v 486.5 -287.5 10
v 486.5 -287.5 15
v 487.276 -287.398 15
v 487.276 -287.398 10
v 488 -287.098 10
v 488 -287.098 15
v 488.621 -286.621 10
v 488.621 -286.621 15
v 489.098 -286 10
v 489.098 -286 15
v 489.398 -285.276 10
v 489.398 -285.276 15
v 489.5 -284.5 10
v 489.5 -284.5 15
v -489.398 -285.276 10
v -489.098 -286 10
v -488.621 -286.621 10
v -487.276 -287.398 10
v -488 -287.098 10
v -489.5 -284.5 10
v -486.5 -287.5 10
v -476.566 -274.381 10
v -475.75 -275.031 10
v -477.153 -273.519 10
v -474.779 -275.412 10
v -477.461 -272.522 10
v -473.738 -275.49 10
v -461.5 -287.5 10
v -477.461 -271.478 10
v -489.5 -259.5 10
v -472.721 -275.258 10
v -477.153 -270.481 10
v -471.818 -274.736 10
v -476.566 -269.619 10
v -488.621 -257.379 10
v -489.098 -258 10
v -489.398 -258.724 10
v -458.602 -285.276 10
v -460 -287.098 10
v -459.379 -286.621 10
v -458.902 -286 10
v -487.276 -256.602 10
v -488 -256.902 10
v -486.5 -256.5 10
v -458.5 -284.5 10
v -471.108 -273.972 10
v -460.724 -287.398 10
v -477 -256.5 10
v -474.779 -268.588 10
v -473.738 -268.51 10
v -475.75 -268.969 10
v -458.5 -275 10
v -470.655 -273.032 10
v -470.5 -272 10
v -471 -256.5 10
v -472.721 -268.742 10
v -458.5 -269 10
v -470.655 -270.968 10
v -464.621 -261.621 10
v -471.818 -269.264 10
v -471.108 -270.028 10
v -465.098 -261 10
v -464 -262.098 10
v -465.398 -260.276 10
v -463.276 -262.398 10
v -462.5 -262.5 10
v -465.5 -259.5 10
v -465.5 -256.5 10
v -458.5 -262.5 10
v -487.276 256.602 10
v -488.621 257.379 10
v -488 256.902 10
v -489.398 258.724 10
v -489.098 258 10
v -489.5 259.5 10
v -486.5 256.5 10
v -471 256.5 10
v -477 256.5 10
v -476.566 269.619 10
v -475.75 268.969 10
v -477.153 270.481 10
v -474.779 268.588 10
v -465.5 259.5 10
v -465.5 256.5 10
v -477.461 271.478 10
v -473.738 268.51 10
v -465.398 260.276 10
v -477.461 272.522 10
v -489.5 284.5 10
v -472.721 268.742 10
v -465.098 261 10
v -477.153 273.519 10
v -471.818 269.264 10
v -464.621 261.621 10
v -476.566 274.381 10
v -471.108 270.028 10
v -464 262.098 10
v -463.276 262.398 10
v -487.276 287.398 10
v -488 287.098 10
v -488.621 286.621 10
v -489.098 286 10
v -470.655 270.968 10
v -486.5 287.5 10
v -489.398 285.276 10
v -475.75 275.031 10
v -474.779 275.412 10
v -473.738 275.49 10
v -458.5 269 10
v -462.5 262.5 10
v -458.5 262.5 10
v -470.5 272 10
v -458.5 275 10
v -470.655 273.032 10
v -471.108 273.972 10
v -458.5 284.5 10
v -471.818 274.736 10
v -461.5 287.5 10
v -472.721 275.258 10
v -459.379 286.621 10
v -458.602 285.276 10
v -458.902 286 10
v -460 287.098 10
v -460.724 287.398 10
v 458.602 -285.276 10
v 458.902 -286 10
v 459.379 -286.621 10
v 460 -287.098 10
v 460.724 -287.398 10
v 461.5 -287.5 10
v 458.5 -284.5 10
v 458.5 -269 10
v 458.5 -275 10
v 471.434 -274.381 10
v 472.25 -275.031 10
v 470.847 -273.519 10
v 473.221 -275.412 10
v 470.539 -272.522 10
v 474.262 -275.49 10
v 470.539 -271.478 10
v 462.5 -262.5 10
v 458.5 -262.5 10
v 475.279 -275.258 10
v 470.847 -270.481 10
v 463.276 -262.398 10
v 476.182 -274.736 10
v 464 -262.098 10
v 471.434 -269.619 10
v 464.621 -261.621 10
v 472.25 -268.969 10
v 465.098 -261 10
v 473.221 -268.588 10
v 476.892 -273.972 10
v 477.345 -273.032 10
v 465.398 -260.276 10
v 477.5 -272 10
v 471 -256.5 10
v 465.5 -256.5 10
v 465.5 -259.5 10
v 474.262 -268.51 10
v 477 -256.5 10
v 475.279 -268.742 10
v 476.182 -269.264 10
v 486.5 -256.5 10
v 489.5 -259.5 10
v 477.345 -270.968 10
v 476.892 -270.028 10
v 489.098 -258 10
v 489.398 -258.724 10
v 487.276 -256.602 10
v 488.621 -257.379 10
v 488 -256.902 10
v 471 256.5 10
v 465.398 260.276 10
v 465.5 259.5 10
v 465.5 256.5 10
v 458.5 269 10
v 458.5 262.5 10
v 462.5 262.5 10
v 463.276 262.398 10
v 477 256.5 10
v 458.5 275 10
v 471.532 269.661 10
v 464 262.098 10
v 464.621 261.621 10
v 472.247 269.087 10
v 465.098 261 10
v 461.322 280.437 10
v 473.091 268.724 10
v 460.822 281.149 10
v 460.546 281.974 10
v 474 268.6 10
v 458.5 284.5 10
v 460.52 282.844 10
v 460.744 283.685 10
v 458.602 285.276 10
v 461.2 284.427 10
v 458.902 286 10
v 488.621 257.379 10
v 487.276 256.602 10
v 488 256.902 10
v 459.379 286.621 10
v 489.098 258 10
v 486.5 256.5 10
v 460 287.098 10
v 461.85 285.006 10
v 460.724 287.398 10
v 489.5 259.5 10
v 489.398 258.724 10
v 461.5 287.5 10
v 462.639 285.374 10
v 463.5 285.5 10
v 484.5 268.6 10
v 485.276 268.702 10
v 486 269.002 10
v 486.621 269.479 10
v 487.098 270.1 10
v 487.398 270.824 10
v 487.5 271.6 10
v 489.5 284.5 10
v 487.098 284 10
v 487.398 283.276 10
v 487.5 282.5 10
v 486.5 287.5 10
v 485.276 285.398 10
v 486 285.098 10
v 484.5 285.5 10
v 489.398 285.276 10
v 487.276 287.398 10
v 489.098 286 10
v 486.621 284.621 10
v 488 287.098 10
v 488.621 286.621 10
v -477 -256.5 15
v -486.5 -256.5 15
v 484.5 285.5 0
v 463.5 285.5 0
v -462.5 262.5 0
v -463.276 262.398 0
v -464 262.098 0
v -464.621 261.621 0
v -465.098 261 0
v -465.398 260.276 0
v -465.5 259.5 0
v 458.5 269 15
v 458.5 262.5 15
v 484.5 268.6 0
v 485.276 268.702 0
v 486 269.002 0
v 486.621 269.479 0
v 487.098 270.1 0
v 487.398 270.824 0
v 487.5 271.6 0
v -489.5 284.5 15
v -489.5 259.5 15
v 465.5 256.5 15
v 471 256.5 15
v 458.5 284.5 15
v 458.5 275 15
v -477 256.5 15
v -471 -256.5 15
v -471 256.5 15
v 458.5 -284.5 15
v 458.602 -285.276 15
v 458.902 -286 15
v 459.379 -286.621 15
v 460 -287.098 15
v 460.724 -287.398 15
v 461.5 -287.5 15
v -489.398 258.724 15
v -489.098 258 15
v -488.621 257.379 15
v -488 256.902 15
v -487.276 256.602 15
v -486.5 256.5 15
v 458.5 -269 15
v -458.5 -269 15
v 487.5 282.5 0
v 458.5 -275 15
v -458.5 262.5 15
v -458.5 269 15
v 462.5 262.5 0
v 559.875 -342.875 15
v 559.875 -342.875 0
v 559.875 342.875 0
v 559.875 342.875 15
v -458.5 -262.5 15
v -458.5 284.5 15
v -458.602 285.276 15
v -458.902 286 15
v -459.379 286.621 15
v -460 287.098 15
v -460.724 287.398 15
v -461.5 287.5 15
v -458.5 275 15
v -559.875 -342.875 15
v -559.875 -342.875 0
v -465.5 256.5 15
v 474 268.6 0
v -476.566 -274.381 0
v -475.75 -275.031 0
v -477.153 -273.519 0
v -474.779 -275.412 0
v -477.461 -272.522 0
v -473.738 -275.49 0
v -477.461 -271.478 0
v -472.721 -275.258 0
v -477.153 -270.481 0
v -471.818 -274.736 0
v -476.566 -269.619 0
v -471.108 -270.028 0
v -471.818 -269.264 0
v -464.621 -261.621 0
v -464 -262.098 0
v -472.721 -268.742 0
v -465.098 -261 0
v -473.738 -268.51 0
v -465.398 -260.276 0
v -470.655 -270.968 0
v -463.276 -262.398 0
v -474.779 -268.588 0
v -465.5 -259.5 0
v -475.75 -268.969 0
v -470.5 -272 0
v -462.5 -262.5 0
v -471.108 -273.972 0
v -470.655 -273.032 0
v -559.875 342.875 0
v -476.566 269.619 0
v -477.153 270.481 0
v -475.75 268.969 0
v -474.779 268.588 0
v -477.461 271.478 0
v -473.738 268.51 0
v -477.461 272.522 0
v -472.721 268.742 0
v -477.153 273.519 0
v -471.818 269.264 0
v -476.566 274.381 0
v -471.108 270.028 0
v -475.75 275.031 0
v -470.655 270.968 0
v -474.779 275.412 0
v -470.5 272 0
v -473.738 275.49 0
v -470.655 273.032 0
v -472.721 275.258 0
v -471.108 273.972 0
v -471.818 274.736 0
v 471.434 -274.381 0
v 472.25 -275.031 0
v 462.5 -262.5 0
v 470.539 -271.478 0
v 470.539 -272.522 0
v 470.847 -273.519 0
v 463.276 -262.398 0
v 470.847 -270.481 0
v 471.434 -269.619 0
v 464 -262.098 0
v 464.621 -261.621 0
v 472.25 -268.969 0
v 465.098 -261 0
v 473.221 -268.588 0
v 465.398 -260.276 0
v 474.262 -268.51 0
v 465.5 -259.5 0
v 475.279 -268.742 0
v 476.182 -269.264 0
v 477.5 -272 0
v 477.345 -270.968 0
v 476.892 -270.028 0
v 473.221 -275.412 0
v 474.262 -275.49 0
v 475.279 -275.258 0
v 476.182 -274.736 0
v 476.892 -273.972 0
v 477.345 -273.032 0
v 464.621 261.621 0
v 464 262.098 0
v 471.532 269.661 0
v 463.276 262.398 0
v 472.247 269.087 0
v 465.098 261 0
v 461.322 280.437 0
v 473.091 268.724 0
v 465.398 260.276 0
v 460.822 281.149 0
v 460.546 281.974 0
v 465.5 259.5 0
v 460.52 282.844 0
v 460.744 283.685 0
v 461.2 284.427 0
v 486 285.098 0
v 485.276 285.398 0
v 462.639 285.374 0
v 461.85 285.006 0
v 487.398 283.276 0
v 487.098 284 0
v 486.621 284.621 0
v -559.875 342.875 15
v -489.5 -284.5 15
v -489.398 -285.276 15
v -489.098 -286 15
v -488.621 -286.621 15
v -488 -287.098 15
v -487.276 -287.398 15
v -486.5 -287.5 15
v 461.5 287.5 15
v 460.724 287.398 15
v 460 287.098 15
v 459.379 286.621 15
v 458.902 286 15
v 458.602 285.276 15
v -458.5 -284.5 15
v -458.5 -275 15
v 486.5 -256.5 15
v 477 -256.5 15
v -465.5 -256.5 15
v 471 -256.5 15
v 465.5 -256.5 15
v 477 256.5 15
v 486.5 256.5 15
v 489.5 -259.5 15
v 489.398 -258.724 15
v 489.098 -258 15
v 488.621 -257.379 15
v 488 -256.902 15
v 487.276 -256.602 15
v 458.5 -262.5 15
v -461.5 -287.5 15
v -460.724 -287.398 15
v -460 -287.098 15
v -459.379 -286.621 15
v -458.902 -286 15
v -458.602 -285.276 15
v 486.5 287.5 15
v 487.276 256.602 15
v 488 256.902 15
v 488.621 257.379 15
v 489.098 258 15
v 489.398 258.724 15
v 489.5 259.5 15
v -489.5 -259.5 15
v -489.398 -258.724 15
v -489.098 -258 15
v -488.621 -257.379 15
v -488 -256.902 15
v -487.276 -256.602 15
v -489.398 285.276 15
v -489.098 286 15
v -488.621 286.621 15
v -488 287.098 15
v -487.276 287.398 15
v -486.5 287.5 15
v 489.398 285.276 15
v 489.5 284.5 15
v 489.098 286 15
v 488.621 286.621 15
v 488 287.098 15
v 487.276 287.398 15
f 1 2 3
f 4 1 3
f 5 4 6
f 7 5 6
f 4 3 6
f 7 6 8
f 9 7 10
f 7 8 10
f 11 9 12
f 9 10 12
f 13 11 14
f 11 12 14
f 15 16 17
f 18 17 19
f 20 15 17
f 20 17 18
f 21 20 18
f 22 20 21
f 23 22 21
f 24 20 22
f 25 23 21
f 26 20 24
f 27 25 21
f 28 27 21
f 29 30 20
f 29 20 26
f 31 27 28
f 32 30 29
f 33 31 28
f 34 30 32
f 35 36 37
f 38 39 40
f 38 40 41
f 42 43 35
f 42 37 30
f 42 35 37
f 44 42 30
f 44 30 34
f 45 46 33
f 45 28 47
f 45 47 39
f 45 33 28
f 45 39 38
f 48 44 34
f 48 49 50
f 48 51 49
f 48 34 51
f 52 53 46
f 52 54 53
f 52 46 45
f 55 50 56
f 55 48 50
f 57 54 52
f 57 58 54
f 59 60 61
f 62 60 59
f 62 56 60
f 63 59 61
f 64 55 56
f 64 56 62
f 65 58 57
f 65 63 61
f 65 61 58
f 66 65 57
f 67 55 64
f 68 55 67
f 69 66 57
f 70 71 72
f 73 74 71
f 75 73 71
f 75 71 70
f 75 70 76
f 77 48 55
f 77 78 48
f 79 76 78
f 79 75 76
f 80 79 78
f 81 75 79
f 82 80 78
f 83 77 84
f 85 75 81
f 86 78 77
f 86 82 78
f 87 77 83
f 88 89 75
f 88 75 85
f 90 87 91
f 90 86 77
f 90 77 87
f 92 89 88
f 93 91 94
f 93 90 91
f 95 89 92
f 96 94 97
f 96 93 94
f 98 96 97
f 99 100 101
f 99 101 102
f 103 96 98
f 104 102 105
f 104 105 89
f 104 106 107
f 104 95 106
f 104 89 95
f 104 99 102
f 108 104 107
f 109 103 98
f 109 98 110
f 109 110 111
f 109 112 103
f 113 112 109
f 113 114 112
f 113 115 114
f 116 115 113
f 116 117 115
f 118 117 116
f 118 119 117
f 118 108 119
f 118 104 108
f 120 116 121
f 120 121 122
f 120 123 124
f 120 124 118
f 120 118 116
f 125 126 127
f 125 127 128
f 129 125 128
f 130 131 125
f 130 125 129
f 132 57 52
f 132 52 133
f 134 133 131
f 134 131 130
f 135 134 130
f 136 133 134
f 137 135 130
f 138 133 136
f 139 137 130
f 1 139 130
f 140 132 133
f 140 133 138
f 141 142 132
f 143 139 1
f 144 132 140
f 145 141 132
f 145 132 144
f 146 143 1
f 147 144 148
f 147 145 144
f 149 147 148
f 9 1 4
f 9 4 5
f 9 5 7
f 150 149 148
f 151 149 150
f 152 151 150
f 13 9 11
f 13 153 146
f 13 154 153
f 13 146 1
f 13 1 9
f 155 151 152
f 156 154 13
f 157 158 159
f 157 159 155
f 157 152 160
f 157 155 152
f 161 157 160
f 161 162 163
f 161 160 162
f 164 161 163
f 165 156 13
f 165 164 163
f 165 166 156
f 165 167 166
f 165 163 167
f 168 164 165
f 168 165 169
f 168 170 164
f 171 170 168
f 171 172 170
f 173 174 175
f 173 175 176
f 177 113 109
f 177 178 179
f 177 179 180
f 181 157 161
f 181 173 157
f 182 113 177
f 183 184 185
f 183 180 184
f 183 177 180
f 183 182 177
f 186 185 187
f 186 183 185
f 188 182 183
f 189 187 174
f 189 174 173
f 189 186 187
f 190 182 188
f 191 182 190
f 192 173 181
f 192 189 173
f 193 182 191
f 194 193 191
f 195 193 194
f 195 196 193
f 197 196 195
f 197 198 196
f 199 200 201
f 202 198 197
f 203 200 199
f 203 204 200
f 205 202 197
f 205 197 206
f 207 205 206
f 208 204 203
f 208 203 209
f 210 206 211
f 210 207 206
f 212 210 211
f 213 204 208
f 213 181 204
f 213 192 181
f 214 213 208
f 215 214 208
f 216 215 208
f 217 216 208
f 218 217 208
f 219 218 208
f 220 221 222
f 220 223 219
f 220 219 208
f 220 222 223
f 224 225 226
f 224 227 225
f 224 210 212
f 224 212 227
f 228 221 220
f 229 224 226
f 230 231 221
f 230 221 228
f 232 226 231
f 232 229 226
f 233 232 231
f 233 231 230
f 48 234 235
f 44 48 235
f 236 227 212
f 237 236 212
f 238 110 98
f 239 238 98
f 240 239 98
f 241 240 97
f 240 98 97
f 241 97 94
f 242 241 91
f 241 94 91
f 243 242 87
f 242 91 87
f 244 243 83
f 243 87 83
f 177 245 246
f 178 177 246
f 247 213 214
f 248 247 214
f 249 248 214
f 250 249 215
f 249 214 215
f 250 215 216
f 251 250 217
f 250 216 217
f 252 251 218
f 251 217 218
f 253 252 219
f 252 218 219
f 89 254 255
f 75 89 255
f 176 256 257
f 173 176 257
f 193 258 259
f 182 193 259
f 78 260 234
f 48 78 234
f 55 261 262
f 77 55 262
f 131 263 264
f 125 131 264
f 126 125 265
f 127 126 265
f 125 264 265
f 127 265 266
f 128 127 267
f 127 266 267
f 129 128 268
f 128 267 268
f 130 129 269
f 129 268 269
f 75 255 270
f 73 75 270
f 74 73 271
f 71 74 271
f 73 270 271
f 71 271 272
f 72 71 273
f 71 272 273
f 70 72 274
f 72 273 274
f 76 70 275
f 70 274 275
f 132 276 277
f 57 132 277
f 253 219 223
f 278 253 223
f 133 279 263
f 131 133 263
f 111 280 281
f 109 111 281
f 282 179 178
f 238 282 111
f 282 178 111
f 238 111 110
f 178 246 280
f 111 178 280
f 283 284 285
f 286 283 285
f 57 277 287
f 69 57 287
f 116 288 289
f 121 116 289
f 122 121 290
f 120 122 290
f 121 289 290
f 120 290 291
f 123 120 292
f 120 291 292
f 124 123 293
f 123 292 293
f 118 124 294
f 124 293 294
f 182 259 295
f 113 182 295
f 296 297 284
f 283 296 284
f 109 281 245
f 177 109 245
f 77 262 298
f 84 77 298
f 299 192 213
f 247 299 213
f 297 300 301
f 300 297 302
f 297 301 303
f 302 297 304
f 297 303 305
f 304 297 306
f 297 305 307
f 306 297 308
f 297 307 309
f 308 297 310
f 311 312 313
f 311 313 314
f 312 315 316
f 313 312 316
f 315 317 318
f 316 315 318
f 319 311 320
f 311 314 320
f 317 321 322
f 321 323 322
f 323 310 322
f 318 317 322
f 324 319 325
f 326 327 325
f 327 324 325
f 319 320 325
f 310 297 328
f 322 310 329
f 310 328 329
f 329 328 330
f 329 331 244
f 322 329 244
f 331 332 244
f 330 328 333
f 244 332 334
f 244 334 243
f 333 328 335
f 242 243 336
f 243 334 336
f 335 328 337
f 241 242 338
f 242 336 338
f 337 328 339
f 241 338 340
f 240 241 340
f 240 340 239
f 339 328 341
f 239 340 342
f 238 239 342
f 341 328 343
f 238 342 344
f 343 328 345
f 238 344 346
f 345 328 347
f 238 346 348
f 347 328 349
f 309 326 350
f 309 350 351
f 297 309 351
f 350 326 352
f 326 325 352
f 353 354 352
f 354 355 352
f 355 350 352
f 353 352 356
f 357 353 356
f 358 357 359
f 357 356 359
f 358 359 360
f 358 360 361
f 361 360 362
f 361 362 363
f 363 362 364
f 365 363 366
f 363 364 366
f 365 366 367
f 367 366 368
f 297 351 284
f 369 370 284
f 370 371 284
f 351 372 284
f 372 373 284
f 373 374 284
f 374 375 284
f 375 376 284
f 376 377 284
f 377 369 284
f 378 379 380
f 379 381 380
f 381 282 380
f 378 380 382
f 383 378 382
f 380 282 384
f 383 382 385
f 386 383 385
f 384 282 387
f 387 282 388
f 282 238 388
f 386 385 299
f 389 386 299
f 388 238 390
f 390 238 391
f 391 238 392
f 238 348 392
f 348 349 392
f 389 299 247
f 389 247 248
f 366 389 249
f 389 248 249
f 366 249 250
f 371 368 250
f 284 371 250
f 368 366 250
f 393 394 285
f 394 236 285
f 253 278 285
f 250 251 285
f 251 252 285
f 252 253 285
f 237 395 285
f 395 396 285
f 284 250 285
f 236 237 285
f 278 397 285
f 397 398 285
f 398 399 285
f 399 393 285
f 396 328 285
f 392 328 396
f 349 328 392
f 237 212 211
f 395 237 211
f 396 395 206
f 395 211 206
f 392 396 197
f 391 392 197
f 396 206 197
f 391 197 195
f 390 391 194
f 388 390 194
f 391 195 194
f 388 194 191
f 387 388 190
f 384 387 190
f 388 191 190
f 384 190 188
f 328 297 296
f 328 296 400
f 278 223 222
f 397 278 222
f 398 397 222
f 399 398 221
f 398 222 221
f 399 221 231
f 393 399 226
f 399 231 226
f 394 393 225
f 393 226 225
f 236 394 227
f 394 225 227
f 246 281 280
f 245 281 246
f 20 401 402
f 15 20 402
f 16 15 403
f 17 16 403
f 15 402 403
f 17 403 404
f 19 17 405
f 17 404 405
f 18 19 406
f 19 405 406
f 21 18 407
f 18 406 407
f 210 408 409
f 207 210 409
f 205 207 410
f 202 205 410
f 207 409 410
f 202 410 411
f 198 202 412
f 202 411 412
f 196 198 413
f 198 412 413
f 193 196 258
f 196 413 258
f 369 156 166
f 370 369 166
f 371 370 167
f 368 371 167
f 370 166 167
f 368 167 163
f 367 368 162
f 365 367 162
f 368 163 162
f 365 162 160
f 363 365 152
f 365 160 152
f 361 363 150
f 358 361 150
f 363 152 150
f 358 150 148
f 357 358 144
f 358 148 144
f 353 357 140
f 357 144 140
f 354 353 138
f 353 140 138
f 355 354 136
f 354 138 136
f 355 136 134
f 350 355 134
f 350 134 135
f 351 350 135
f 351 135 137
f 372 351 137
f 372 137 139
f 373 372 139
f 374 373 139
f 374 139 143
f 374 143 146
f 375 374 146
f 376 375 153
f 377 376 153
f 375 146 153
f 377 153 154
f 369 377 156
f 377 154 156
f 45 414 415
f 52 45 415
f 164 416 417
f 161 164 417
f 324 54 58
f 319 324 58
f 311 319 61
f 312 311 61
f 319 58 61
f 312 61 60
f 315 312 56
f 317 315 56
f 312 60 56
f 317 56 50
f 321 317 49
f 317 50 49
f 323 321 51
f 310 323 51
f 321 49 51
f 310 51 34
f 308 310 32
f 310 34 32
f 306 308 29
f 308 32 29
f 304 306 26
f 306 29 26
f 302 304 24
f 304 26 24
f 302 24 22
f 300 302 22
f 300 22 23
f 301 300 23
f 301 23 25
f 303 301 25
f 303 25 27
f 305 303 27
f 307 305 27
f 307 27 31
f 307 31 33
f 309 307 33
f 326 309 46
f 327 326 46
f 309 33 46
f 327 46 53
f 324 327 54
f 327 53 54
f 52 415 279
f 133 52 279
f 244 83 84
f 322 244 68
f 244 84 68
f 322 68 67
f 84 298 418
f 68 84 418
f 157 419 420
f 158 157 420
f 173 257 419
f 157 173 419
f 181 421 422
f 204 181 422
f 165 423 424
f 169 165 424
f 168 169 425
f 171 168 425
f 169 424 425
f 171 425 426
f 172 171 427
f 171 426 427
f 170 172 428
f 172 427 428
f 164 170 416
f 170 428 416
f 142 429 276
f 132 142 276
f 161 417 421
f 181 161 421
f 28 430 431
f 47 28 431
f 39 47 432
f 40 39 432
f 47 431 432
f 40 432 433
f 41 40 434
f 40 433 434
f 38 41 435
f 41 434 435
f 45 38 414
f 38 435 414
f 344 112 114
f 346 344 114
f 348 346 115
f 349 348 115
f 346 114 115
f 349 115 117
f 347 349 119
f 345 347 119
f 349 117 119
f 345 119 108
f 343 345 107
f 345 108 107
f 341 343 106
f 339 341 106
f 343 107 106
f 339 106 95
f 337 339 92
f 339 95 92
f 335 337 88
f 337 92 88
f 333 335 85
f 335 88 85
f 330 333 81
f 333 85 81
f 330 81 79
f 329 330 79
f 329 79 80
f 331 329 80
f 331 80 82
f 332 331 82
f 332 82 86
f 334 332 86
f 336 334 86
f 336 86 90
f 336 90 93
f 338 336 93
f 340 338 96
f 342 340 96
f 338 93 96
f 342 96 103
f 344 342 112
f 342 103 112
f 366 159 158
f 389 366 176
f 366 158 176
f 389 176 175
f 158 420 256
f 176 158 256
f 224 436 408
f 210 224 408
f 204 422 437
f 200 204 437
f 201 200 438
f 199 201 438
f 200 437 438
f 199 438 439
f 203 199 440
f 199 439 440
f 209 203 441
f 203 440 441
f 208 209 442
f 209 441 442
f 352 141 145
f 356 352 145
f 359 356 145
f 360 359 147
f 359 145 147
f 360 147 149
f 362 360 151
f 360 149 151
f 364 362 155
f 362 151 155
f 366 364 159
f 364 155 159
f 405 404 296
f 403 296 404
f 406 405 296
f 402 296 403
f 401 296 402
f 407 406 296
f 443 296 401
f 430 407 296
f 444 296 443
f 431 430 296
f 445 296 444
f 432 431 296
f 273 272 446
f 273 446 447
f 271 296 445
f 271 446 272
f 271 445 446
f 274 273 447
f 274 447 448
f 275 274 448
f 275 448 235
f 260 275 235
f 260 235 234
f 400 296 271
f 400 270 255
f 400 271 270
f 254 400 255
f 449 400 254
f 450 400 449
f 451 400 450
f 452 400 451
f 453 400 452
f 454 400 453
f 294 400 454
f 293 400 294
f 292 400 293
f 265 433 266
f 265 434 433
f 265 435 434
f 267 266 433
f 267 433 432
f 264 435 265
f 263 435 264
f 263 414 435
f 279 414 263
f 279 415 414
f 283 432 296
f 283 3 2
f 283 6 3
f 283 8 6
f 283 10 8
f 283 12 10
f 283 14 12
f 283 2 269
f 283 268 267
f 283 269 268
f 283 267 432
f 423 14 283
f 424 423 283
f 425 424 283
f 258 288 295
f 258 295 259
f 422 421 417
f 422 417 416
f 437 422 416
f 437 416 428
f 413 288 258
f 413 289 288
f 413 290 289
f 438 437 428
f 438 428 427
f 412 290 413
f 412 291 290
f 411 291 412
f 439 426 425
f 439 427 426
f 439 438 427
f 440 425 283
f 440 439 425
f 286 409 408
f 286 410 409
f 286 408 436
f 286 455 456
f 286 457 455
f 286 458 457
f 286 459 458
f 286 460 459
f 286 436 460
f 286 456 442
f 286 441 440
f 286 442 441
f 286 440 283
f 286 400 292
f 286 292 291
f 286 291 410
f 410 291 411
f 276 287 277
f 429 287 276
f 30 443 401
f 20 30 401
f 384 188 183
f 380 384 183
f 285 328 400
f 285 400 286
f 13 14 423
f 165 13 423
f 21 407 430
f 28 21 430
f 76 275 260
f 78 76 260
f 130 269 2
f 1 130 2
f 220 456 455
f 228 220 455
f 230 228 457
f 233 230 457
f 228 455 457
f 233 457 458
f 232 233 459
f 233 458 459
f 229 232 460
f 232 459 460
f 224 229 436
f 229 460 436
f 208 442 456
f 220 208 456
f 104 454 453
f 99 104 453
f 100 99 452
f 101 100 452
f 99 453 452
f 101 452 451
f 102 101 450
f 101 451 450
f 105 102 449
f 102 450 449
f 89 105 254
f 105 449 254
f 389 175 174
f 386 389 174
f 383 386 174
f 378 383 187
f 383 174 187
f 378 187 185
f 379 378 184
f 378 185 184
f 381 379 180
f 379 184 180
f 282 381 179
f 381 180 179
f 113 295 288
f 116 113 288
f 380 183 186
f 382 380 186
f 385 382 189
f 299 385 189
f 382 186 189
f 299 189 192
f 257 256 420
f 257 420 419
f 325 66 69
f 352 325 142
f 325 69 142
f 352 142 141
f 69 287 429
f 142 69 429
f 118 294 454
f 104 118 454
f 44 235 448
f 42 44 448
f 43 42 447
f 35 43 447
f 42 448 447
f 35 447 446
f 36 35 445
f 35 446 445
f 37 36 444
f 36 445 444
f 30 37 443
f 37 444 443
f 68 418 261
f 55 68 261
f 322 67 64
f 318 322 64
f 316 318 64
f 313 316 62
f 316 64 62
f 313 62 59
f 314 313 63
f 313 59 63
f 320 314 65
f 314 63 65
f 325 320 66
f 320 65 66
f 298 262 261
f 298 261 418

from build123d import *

# Parameters (mm, degrees)
F0_W     = 1119.75
F0_H     = 685.75
F1_DEPTH = 15
F3_DEPTH = 5
F4_R     = 3.5
F5_DEPTH = 10
F7_DEPTH = 15


with BuildPart() as f1:
    # F0 (on Top) → F1 (new body)
    with BuildSketch(Plane.XY):
        Rectangle(F0_W, F0_H)
    extrude(amount=F1_DEPTH)

    # F2 (on face) → F3 (cut)
    with BuildSketch(Plane.XY.offset(15)):
        with BuildLine():
            Line((0, 269), (0, 275))
            Line((0, 275), (-458.5, 275))
            Line((-458.5, 275), (-458.5, 284.5))
            ThreePointArc((-458.5, 284.5), (-459.37868, 286.62132), (-461.5, 287.5))
            Line((-461.5, 287.5), (-486.5, 287.5))
            ThreePointArc((-486.5, 287.5), (-488.62132, 286.62132), (-489.5, 284.5))
            Line((-489.5, 284.5), (-489.5, 259.5))
            ThreePointArc((-489.5, 259.5), (-488.62132, 257.37868), (-486.5, 256.5))
            Line((-486.5, 256.5), (-477, 256.5))
            Line((-477, 256.5), (-477, 0))
            Line((-477, 0), (-471, 0))
            Line((-471, 0), (-471, 256.5))
            Line((-471, 256.5), (-461.5, 256.5))
            ThreePointArc((-461.5, 256.5), (-459.37868, 257.37868), (-458.5, 259.5))
            Line((-458.5, 259.5), (-458.5, 269))
            Line((-458.5, 269), (0, 269))
        make_face()
        with BuildLine():
            Line((458.5, 275), (0, 275))
            Line((0, 275), (0, 269))
            Line((0, 269), (458.5, 269))
            Line((458.5, 269), (458.5, 259.5))
            ThreePointArc((458.5, 259.5), (459.37868, 257.37868), (461.5, 256.5))
            Line((461.5, 256.5), (471, 256.5))
            Line((471, 256.5), (471, 0))
            Line((471, 0), (471, -256.5))
            Line((471, -256.5), (461.5, -256.5))
            ThreePointArc((461.5, -256.5), (459.37868, -257.37868), (458.5, -259.5))
            Line((458.5, -259.5), (458.5, -269))
            Line((458.5, -269), (0, -269))
            Line((0, -269), (-458.5, -269))
            Line((-458.5, -269), (-458.5, -259.5))
            ThreePointArc((-458.5, -259.5), (-459.37868, -257.37868), (-461.5, -256.5))
            Line((-461.5, -256.5), (-471, -256.5))
            Line((-471, -256.5), (-471, 0))
            Line((-471, 0), (-477, 0))
            Line((-477, 0), (-477, -256.5))
            Line((-477, -256.5), (-486.5, -256.5))
            ThreePointArc((-486.5, -256.5), (-488.62132, -257.37868), (-489.5, -259.5))
            Line((-489.5, -259.5), (-489.5, -284.5))
            ThreePointArc((-489.5, -284.5), (-488.62132, -286.62132), (-486.5, -287.5))
            Line((-486.5, -287.5), (-461.5, -287.5))
            ThreePointArc((-461.5, -287.5), (-459.37868, -286.62132), (-458.5, -284.5))
            Line((-458.5, -284.5), (-458.5, -275))
            Line((-458.5, -275), (0, -275))
            Line((0, -275), (458.5, -275))
            Line((458.5, -275), (458.5, -284.5))
            ThreePointArc((458.5, -284.5), (459.37868, -286.62132), (461.5, -287.5))
            Line((461.5, -287.5), (486.5, -287.5))
            ThreePointArc((486.5, -287.5), (488.62132, -286.62132), (489.5, -284.5))
            Line((489.5, -284.5), (489.5, -259.5))
            ThreePointArc((489.5, -259.5), (488.62132, -257.37868), (486.5, -256.5))
            Line((486.5, -256.5), (477, -256.5))
            Line((477, -256.5), (477, 0))
            Line((477, 0), (477, 256.5))
            Line((477, 256.5), (486.5, 256.5))
            ThreePointArc((486.5, 256.5), (488.62132, 257.37868), (489.5, 259.5))
            Line((489.5, 259.5), (489.5, 284.5))
            ThreePointArc((489.5, 284.5), (488.62132, 286.62132), (486.5, 287.5))
            Line((486.5, 287.5), (461.5, 287.5))
            ThreePointArc((461.5, 287.5), (459.37868, 286.62132), (458.5, 284.5))
            Line((458.5, 284.5), (458.5, 275))
        make_face()
    extrude(amount=-F3_DEPTH, mode=Mode.SUBTRACT)

    # F4 (on face) → F5 (cut, through all)
    with BuildSketch(Plane.XY.offset(10)):
        with Locations((-474, 272)):
            Circle(F4_R)
        with Locations((474, -272)):
            Circle(F4_R)
        with Locations((-474, -272)):
            Circle(F4_R)
        with BuildLine():
            Line((484.5, 285.5), (463.5, 285.5))
            ThreePointArc((463.5, 285.5), (460.744077, 283.68528), (461.322307, 280.436592))
            Line((461.322307, 280.436592), (471.531947, 269.661471))
            ThreePointArc((471.531947, 269.661471), (472.656683, 268.876621), (474, 268.6))
            Line((474, 268.6), (484.5, 268.6))
            ThreePointArc((484.5, 268.6), (486.62132, 269.47868), (487.5, 271.6))
            Line((487.5, 271.6), (487.5, 282.5))
            ThreePointArc((487.5, 282.5), (486.62132, 284.62132), (484.5, 285.5))
        make_face()
    extrude(amount=-F5_DEPTH, mode=Mode.SUBTRACT)

    # F6 (on face) → F7 (cut, through all)
    with BuildSketch(Plane.XY.offset(15)):
        with BuildLine():
            Line((462.5, 262.5), (-462.5, 262.5))
            ThreePointArc((-462.5, 262.5), (-464.62132, 261.62132), (-465.5, 259.5))
            Line((-465.5, 259.5), (-465.5, -259.5))
            ThreePointArc((-465.5, -259.5), (-464.62132, -261.62132), (-462.5, -262.5))
            Line((-462.5, -262.5), (462.5, -262.5))
            ThreePointArc((462.5, -262.5), (464.62132, -261.62132), (465.5, -259.5))
            Line((465.5, -259.5), (465.5, 259.5))
            ThreePointArc((465.5, 259.5), (464.62132, 261.62132), (462.5, 262.5))
        make_face()
    extrude(amount=-F7_DEPTH, mode=Mode.SUBTRACT)


solid = f1.part
